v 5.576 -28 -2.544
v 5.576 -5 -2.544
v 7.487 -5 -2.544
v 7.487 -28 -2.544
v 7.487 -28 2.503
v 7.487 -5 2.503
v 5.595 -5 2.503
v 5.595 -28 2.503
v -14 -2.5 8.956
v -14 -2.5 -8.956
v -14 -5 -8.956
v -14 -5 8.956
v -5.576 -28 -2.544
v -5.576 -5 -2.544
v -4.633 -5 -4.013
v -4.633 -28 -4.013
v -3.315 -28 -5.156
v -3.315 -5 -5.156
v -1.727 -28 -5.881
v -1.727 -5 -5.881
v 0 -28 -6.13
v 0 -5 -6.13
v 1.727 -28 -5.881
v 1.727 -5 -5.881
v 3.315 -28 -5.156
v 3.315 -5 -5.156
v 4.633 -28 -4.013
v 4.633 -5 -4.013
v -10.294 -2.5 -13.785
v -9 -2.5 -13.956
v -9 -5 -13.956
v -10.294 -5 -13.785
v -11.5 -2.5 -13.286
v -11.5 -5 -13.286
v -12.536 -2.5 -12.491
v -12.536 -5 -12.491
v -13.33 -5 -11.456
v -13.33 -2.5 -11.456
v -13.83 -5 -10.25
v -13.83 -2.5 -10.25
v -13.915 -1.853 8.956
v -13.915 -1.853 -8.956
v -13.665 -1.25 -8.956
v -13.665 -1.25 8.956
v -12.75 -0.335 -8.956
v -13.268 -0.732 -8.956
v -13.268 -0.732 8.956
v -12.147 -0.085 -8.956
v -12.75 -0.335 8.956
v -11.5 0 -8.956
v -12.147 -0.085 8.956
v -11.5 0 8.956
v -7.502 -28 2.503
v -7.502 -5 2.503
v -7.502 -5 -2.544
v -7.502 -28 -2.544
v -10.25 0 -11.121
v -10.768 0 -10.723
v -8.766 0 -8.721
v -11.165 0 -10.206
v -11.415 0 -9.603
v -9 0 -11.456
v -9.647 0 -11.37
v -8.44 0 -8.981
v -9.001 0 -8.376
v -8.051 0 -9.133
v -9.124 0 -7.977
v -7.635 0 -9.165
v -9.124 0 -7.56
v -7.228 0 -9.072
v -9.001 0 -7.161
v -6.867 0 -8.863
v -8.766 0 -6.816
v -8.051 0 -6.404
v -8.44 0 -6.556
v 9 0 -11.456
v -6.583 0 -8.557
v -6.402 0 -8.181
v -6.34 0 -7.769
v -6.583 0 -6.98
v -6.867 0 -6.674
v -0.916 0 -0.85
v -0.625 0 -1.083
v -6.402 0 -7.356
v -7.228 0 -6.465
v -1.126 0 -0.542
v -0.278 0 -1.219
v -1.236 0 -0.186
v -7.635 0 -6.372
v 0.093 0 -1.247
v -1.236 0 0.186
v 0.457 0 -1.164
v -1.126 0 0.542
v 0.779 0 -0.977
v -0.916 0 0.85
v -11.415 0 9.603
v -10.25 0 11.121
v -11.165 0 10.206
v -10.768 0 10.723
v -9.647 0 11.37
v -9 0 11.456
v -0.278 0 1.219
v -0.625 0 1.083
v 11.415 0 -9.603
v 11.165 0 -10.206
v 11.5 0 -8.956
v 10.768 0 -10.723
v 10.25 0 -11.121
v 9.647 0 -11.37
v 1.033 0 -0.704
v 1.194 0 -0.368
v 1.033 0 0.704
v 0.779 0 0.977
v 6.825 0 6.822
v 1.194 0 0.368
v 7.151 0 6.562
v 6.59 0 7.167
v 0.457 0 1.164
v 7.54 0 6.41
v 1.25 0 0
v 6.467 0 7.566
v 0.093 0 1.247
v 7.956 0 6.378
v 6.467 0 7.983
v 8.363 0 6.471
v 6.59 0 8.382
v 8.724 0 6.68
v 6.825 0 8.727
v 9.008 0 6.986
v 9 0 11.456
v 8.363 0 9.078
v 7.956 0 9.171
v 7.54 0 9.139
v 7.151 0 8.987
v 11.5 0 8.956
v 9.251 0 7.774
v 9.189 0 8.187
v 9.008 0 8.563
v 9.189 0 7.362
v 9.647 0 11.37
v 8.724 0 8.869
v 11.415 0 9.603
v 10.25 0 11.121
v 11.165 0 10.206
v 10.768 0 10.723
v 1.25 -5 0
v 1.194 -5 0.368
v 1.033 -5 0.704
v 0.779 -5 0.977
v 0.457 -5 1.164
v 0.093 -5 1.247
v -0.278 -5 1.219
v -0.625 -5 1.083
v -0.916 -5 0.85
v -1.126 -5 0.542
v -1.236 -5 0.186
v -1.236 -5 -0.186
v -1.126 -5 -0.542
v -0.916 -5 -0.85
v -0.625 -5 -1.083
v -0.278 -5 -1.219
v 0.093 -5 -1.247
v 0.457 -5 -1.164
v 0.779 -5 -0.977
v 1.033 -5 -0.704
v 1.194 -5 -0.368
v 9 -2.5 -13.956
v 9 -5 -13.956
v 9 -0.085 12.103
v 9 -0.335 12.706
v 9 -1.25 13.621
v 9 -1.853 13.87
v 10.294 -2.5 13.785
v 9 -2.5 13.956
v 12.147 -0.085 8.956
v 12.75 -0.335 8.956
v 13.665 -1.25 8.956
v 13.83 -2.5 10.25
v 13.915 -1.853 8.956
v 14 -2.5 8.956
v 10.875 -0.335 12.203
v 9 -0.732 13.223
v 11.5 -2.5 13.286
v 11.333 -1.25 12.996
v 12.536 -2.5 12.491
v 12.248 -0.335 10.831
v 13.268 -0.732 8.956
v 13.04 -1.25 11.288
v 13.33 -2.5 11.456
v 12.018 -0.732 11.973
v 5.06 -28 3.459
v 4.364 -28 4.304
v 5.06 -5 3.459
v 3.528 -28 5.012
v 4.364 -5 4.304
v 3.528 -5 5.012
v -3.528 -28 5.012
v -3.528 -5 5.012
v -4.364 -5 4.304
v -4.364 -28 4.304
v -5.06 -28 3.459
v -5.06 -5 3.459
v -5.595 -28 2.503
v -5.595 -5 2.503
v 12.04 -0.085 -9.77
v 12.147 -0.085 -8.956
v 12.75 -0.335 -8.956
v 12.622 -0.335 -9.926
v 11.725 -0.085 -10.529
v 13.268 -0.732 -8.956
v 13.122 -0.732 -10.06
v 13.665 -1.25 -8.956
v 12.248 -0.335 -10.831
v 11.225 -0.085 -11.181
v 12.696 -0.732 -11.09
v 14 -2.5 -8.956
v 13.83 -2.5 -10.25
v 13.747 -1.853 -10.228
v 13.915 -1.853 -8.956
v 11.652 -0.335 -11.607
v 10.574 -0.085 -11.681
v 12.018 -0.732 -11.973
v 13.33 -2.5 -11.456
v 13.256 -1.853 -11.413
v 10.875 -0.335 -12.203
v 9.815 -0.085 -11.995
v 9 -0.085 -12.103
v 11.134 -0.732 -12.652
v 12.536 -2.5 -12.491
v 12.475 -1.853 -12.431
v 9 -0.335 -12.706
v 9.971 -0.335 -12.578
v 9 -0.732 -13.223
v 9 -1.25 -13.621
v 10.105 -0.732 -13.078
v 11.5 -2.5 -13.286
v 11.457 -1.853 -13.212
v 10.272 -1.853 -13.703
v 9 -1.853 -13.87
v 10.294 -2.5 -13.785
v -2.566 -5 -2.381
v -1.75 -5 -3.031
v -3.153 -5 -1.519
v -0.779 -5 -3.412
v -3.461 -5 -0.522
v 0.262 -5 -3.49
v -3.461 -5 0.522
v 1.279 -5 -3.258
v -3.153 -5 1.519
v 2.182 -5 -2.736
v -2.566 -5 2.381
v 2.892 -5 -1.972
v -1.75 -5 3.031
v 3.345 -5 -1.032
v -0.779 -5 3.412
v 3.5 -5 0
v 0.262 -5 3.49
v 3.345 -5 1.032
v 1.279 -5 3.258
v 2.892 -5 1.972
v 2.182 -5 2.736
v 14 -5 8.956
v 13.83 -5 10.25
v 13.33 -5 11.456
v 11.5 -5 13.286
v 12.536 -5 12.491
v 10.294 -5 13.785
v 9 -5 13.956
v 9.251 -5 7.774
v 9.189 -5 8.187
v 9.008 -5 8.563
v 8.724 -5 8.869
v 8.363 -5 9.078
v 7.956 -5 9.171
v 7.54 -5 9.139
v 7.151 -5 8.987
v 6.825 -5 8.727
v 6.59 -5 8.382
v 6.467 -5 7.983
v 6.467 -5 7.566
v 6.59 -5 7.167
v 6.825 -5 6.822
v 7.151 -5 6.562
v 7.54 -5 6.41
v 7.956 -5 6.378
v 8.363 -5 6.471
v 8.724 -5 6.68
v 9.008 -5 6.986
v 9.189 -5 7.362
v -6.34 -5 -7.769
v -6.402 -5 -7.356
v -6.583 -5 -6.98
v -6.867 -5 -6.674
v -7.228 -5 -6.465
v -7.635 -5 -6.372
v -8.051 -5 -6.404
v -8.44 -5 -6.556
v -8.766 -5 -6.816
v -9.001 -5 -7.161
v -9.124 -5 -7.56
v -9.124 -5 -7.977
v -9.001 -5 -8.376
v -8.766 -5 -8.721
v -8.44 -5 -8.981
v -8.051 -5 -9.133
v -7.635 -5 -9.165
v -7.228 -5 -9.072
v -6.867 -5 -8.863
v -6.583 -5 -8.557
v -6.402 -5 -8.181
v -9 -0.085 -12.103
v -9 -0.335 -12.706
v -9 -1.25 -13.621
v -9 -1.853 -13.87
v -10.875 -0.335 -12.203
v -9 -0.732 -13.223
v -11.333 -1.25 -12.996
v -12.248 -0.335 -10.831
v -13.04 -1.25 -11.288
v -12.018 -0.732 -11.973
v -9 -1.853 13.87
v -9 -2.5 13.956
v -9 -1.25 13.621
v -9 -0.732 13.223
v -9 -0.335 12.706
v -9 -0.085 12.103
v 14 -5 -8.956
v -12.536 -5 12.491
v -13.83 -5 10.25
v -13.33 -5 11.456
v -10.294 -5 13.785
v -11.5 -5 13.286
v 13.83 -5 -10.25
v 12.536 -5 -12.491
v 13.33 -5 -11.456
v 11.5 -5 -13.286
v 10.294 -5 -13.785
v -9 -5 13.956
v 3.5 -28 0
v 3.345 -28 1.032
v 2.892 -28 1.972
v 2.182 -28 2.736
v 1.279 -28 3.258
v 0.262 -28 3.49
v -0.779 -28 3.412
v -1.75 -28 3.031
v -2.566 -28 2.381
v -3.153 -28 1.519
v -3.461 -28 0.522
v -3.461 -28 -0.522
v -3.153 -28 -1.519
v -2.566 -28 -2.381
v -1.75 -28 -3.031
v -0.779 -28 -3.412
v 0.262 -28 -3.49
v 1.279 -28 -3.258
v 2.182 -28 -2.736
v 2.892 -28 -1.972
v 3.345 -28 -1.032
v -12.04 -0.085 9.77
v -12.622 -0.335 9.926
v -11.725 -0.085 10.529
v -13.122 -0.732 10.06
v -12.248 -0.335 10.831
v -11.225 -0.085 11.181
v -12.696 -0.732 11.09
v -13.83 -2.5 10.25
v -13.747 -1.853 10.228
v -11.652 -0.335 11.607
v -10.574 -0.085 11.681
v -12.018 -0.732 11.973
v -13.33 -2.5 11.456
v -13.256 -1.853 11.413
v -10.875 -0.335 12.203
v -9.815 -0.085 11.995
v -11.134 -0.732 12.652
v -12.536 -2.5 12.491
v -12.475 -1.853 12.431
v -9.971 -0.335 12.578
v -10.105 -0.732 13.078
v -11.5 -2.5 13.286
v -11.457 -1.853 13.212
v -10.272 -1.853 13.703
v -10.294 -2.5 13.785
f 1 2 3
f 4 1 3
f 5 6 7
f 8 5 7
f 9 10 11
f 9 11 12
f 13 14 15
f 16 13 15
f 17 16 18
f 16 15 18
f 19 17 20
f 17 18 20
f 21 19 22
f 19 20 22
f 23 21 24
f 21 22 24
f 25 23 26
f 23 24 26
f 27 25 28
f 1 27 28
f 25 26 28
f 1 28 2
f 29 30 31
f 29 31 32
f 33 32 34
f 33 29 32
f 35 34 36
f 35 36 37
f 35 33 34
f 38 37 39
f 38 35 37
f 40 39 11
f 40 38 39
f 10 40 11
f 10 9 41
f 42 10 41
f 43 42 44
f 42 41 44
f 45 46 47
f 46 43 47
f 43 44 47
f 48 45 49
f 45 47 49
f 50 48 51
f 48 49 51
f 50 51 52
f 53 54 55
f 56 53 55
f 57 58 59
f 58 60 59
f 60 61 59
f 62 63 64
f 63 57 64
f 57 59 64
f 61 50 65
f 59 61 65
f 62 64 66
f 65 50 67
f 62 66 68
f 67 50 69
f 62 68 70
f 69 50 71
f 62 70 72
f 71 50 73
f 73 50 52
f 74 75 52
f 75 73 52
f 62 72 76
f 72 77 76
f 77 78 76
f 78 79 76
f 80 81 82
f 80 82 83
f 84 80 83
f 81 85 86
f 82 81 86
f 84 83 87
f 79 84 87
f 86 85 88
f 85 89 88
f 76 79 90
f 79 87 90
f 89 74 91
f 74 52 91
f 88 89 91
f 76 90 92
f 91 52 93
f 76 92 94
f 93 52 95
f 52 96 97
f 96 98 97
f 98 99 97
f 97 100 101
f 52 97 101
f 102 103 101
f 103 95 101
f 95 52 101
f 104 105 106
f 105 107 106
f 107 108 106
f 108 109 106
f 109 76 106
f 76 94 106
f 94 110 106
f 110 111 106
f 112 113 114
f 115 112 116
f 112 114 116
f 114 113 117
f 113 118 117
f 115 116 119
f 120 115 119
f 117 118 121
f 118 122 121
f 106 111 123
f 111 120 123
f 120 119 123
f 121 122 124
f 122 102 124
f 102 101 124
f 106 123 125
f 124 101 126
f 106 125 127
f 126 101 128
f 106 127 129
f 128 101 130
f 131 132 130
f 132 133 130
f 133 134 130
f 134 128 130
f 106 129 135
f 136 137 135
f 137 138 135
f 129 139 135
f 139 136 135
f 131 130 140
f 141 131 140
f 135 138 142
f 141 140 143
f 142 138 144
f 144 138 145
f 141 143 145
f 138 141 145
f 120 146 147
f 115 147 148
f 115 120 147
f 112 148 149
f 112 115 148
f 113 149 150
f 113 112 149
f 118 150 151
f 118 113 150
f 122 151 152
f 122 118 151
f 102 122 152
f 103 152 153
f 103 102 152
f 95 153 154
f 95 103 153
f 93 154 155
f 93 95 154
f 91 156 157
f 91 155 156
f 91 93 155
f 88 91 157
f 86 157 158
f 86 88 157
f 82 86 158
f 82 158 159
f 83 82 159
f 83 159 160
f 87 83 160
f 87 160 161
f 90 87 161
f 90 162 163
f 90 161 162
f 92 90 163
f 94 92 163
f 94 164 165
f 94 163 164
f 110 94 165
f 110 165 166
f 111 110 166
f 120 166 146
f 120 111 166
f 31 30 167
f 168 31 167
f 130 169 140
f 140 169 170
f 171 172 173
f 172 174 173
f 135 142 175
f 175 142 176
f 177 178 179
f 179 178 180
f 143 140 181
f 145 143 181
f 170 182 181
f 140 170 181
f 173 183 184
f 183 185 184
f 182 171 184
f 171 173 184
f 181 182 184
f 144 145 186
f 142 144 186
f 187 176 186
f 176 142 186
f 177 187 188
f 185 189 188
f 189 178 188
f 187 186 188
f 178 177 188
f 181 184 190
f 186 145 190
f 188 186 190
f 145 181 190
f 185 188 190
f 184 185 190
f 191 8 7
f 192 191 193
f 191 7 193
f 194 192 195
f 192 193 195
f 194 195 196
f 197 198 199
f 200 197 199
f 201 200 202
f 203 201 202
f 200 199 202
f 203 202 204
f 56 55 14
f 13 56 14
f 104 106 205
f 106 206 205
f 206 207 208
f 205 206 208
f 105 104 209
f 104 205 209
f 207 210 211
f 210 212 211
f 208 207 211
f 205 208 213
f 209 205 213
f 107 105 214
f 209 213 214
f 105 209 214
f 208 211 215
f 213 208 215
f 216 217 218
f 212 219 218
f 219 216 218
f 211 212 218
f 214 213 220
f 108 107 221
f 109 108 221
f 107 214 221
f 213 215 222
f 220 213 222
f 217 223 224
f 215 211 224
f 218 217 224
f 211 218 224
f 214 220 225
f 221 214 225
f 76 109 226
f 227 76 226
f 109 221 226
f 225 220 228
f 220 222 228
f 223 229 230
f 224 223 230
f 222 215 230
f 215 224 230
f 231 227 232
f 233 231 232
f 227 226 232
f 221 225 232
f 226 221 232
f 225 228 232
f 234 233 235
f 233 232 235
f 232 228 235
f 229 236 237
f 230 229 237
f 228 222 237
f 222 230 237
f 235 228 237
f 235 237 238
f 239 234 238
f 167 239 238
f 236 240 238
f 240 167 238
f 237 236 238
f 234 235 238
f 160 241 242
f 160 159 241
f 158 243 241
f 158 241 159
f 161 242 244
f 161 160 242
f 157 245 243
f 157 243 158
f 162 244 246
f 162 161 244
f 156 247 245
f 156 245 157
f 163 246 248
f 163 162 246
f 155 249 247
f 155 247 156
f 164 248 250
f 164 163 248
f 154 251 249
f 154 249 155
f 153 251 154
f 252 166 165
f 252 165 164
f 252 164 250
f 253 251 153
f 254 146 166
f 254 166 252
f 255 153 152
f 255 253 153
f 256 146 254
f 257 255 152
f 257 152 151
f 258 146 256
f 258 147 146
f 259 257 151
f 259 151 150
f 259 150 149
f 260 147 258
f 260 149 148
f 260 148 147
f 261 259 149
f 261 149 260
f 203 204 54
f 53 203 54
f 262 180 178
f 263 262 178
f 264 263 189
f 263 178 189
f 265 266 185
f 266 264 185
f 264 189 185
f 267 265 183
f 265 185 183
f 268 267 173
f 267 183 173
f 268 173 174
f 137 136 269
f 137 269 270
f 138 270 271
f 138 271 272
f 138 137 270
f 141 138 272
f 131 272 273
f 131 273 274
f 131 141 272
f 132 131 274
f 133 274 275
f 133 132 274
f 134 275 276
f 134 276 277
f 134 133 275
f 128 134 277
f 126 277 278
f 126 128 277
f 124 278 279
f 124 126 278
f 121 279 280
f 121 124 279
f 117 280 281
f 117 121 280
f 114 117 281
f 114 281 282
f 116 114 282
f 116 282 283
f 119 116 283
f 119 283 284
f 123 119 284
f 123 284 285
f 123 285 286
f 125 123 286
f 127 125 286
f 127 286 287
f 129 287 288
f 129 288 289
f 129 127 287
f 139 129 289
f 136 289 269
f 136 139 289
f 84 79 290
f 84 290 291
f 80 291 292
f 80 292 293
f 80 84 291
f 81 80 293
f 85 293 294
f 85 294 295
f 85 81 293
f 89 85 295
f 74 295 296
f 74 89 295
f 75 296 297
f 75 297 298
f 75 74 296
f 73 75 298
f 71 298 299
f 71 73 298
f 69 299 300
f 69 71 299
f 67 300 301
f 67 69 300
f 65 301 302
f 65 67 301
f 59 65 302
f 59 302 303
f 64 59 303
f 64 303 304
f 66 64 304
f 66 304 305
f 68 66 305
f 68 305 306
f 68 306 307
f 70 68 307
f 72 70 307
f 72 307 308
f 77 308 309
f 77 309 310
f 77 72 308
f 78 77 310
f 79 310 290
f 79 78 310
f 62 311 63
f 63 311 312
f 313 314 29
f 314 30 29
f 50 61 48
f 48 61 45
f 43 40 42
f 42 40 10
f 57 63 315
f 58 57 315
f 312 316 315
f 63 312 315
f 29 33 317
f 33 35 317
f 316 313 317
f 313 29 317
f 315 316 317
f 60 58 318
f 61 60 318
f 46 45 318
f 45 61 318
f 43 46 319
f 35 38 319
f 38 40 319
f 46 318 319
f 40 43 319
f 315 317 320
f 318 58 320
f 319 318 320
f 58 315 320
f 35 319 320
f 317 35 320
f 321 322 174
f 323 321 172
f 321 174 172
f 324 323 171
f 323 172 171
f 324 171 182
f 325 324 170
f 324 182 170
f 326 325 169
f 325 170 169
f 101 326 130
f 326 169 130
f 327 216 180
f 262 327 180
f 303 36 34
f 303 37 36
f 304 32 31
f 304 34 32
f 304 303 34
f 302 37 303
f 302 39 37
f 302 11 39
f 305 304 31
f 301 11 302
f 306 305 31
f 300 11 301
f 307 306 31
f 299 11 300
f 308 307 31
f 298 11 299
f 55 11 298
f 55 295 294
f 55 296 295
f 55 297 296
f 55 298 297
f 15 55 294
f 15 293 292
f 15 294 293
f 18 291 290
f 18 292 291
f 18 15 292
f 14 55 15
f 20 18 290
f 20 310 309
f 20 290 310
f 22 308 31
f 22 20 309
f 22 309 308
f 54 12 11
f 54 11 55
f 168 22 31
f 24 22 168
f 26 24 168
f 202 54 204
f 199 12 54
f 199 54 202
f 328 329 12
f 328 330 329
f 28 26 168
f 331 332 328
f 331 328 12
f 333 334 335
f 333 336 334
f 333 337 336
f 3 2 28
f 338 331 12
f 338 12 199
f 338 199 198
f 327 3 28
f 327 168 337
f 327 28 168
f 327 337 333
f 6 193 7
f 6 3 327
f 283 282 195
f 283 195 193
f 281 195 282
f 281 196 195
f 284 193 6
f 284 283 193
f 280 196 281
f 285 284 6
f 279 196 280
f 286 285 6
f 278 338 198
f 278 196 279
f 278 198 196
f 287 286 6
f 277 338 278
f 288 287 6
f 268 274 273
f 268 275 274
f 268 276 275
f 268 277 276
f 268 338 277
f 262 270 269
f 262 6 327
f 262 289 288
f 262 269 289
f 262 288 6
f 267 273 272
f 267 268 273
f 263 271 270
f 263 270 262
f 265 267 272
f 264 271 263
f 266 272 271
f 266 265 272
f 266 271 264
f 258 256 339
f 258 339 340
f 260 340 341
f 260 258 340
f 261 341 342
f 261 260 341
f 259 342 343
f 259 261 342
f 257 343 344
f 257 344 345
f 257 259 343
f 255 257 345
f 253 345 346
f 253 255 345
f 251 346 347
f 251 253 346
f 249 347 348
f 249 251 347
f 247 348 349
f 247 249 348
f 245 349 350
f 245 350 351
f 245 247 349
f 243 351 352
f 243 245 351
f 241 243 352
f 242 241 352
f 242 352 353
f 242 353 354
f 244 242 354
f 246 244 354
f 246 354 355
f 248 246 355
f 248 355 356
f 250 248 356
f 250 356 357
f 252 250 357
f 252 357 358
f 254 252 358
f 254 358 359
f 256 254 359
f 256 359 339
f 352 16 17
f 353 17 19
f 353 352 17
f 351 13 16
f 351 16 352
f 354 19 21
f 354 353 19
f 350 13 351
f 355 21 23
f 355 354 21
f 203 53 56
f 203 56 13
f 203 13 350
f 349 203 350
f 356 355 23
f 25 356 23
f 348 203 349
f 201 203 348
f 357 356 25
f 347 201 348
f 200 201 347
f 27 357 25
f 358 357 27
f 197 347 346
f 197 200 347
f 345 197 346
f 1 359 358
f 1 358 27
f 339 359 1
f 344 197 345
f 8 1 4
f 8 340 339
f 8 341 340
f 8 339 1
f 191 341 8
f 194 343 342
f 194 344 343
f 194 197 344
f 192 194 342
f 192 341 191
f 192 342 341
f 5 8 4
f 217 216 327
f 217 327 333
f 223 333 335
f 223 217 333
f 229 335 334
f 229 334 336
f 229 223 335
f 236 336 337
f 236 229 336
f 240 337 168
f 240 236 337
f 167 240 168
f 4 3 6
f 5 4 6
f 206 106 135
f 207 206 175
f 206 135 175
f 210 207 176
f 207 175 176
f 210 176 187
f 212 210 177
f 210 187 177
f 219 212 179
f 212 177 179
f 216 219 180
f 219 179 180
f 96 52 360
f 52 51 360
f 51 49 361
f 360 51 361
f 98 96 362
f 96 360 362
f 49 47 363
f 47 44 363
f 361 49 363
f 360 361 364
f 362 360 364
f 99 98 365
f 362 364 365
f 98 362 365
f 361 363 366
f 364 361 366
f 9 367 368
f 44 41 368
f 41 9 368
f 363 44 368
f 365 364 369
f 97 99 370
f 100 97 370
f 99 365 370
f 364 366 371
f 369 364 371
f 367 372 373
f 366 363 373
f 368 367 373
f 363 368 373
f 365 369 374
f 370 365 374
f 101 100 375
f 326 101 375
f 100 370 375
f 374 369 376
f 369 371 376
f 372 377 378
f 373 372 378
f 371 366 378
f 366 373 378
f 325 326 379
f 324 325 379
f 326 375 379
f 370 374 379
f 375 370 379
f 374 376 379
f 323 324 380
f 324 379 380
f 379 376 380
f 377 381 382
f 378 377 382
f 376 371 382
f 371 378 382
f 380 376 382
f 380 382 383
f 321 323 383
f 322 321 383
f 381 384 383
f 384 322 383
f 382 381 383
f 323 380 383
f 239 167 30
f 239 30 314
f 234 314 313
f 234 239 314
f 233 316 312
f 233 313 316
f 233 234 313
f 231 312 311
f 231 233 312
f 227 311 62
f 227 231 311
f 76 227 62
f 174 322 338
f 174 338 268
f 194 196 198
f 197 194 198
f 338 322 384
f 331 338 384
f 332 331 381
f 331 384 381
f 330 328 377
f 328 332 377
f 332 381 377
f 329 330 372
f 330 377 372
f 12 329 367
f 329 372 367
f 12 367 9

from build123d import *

# Parameters (mm, degrees)
F0_R         = 3.5
F1_DEPTH     = 28
F2_W         = 28
F2_H         = 27.9113203287
F2_R         = 1.4
F3_DEPTH     = 5
F4_R         = 2.5
F5_T1_DEPTH  = 17.5
F5_T4_ANGLE  = 90
F5_T6_ANGLE  = 90
F5_T8_ANGLE  = 90
F5_T10_ANGLE = 90
F0_R_2       = 1.25
F6_DEPTH     = 10


# Not quite as in the source:
# - a fillet or chamfer that OpenCascade refuses, or shapes differently, is made with other operations: its cross-section is extruded or revolved along the edge and cut away or added


with BuildPart() as f1:
    # F0 (on Front) → F1 (new body)
    with BuildSketch(Plane.XZ):
        with BuildLine():
            Line((3.528, 5.0124127732), (-3.528, 5.0124127732))
            ThreePointArc((-3.528, 5.0124127732), (-4.7310778559, 3.8971743778), (-5.5952764673, 2.5027878582))
            Line((-5.5952764673, 2.5027878582), (-7.5016845949, 2.5027878582))
            Line((-7.5016845949, 2.5027878582), (-7.5016845949, -2.5444291532))
            Line((-7.5016845949, -2.5444291532), (-5.5764635831, -2.5444291532))
            ThreePointArc((-5.5764635831, -2.5444291532), (0, -6.1295241095), (5.5764635831, -2.5444291532))
            Line((5.5764635831, -2.5444291532), (7.4870199896, -2.5444291532))
            Line((7.4870199896, -2.5444291532), (7.4870199896, 2.5027878582))
            Line((7.4870199896, 2.5027878582), (5.5952764673, 2.5027878582))
            ThreePointArc((5.5952764673, 2.5027878582), (4.7310778559, 3.8971743778), (3.528, 5.0124127732))
        make_face()
        Circle(F0_R, mode=Mode.SUBTRACT)
    extrude(amount=F1_DEPTH)

    # F2 (on Front) → F3 (join)
    with BuildSketch(Plane.XZ):
        Rectangle(F2_W, F2_H)
        with Locations((-7.7399509028, -7.7685024589)):
            Circle(F2_R, mode=Mode.SUBTRACT)
        with Locations((7.8511200845, 7.7744480222)):
            Circle(F2_R, mode=Mode.SUBTRACT)
    extrude(amount=F3_DEPTH)

    # F4
    f4_edges = [f1.edges().sort_by_distance(p)[0] for p in [
        (14, 0, 0),
        (0, 0, -13.95566),
        (-14, 0, 0),
        (0, 0, 13.95566),
    ]]
    fillet(f4_edges, radius=F4_R)

    # F5: fillet of radius 5 on 4 edges, made by hand

    # F5_s2 → F5_t1 (cut)
    with BuildSketch(Plane.XZ):
        with BuildLine():
            ThreePointArc((-9, 13.9556601644), (-12.5355339059, 12.4911940703), (-14, 8.9556601644))
            Line((-14, 8.9556601644), (-14, 13.9556601644))
            Line((-14, 13.9556601644), (-9, 13.9556601644))
        make_face()
        with BuildLine():
            ThreePointArc((14, 8.9556601644), (12.5355339059, 12.4911940703), (9, 13.9556601644))
            Line((9, 13.9556601644), (14, 13.9556601644))
            Line((14, 13.9556601644), (14, 8.9556601644))
        make_face()
        with BuildLine():
            ThreePointArc((14, -8.9556601644), (12.5355339059, -12.4911940703), (9, -13.9556601644))
            Line((9, -13.9556601644), (14, -13.9556601644))
            Line((14, -13.9556601644), (14, -8.9556601644))
        make_face()
        with BuildLine():
            ThreePointArc((-9, -13.9556601644), (-12.5355339059, -12.4911940703), (-14, -8.9556601644))
            Line((-14, -8.9556601644), (-14, -13.9556601644))
            Line((-14, -13.9556601644), (-9, -13.9556601644))
        make_face()
    extrude(amount=F5_T1_DEPTH, mode=Mode.SUBTRACT)

    # F5_s3 → F5_t4 (revolve, cut)
    with BuildSketch(Plane.YZ.offset(-9)):
        with BuildLine():
            ThreePointArc((0, -11.4556601644), (-0.732233047, -13.2234271173), (-2.5, -13.9556601644))
            Line((-2.5, -13.9556601644), (0, -13.9556601644))
            Line((0, -13.9556601644), (0, -11.4556601644))
        make_face()
    revolve(axis=Axis((-9, 0, -8.9556601644), (0, 1, 0)), revolution_arc=F5_T4_ANGLE, mode=Mode.SUBTRACT)

    # F5_s5 → F5_t6 (revolve, cut)
    with BuildSketch(Plane.XY.offset(-8.9556601644)):
        with BuildLine():
            ThreePointArc((11.5, 0), (13.267766953, -0.732233047), (14, -2.5))
            Line((14, -2.5), (14, 0))
            Line((14, 0), (11.5, 0))
        make_face()
    revolve(axis=Axis((9, 0, -8.9556601644), (0, 1, 0)), revolution_arc=F5_T6_ANGLE, mode=Mode.SUBTRACT)

    # F5_s7 → F5_t8 (revolve, cut)
    with BuildSketch(Plane.YZ.offset(9)):
        with BuildLine():
            ThreePointArc((0, 11.4556601644), (-0.732233047, 13.2234271173), (-2.5, 13.9556601644))
            Line((-2.5, 13.9556601644), (0, 13.9556601644))
            Line((0, 13.9556601644), (0, 11.4556601644))
        make_face()
    revolve(axis=Axis((9, 0, 8.9556601644), (0, 1, 0)), revolution_arc=F5_T8_ANGLE, mode=Mode.SUBTRACT)

    # F5_s9 → F5_t10 (revolve, cut)
    with BuildSketch(Plane.XY.offset(8.9556601644)):
        with BuildLine():
            ThreePointArc((-11.5, 0), (-13.267766953, -0.732233047), (-14, -2.5))
            Line((-14, -2.5), (-14, 0))
            Line((-14, 0), (-11.5, 0))
        make_face()
    revolve(axis=Axis((-9, 0, 8.9556601644), (0, 1, 0)), revolution_arc=F5_T10_ANGLE, mode=Mode.SUBTRACT)

    # F0 (on Front) → F6 (cut)
    with BuildSketch(Plane.XZ):
        Circle(F0_R_2)
    extrude(amount=F6_DEPTH, mode=Mode.SUBTRACT)


solid = f1.part
